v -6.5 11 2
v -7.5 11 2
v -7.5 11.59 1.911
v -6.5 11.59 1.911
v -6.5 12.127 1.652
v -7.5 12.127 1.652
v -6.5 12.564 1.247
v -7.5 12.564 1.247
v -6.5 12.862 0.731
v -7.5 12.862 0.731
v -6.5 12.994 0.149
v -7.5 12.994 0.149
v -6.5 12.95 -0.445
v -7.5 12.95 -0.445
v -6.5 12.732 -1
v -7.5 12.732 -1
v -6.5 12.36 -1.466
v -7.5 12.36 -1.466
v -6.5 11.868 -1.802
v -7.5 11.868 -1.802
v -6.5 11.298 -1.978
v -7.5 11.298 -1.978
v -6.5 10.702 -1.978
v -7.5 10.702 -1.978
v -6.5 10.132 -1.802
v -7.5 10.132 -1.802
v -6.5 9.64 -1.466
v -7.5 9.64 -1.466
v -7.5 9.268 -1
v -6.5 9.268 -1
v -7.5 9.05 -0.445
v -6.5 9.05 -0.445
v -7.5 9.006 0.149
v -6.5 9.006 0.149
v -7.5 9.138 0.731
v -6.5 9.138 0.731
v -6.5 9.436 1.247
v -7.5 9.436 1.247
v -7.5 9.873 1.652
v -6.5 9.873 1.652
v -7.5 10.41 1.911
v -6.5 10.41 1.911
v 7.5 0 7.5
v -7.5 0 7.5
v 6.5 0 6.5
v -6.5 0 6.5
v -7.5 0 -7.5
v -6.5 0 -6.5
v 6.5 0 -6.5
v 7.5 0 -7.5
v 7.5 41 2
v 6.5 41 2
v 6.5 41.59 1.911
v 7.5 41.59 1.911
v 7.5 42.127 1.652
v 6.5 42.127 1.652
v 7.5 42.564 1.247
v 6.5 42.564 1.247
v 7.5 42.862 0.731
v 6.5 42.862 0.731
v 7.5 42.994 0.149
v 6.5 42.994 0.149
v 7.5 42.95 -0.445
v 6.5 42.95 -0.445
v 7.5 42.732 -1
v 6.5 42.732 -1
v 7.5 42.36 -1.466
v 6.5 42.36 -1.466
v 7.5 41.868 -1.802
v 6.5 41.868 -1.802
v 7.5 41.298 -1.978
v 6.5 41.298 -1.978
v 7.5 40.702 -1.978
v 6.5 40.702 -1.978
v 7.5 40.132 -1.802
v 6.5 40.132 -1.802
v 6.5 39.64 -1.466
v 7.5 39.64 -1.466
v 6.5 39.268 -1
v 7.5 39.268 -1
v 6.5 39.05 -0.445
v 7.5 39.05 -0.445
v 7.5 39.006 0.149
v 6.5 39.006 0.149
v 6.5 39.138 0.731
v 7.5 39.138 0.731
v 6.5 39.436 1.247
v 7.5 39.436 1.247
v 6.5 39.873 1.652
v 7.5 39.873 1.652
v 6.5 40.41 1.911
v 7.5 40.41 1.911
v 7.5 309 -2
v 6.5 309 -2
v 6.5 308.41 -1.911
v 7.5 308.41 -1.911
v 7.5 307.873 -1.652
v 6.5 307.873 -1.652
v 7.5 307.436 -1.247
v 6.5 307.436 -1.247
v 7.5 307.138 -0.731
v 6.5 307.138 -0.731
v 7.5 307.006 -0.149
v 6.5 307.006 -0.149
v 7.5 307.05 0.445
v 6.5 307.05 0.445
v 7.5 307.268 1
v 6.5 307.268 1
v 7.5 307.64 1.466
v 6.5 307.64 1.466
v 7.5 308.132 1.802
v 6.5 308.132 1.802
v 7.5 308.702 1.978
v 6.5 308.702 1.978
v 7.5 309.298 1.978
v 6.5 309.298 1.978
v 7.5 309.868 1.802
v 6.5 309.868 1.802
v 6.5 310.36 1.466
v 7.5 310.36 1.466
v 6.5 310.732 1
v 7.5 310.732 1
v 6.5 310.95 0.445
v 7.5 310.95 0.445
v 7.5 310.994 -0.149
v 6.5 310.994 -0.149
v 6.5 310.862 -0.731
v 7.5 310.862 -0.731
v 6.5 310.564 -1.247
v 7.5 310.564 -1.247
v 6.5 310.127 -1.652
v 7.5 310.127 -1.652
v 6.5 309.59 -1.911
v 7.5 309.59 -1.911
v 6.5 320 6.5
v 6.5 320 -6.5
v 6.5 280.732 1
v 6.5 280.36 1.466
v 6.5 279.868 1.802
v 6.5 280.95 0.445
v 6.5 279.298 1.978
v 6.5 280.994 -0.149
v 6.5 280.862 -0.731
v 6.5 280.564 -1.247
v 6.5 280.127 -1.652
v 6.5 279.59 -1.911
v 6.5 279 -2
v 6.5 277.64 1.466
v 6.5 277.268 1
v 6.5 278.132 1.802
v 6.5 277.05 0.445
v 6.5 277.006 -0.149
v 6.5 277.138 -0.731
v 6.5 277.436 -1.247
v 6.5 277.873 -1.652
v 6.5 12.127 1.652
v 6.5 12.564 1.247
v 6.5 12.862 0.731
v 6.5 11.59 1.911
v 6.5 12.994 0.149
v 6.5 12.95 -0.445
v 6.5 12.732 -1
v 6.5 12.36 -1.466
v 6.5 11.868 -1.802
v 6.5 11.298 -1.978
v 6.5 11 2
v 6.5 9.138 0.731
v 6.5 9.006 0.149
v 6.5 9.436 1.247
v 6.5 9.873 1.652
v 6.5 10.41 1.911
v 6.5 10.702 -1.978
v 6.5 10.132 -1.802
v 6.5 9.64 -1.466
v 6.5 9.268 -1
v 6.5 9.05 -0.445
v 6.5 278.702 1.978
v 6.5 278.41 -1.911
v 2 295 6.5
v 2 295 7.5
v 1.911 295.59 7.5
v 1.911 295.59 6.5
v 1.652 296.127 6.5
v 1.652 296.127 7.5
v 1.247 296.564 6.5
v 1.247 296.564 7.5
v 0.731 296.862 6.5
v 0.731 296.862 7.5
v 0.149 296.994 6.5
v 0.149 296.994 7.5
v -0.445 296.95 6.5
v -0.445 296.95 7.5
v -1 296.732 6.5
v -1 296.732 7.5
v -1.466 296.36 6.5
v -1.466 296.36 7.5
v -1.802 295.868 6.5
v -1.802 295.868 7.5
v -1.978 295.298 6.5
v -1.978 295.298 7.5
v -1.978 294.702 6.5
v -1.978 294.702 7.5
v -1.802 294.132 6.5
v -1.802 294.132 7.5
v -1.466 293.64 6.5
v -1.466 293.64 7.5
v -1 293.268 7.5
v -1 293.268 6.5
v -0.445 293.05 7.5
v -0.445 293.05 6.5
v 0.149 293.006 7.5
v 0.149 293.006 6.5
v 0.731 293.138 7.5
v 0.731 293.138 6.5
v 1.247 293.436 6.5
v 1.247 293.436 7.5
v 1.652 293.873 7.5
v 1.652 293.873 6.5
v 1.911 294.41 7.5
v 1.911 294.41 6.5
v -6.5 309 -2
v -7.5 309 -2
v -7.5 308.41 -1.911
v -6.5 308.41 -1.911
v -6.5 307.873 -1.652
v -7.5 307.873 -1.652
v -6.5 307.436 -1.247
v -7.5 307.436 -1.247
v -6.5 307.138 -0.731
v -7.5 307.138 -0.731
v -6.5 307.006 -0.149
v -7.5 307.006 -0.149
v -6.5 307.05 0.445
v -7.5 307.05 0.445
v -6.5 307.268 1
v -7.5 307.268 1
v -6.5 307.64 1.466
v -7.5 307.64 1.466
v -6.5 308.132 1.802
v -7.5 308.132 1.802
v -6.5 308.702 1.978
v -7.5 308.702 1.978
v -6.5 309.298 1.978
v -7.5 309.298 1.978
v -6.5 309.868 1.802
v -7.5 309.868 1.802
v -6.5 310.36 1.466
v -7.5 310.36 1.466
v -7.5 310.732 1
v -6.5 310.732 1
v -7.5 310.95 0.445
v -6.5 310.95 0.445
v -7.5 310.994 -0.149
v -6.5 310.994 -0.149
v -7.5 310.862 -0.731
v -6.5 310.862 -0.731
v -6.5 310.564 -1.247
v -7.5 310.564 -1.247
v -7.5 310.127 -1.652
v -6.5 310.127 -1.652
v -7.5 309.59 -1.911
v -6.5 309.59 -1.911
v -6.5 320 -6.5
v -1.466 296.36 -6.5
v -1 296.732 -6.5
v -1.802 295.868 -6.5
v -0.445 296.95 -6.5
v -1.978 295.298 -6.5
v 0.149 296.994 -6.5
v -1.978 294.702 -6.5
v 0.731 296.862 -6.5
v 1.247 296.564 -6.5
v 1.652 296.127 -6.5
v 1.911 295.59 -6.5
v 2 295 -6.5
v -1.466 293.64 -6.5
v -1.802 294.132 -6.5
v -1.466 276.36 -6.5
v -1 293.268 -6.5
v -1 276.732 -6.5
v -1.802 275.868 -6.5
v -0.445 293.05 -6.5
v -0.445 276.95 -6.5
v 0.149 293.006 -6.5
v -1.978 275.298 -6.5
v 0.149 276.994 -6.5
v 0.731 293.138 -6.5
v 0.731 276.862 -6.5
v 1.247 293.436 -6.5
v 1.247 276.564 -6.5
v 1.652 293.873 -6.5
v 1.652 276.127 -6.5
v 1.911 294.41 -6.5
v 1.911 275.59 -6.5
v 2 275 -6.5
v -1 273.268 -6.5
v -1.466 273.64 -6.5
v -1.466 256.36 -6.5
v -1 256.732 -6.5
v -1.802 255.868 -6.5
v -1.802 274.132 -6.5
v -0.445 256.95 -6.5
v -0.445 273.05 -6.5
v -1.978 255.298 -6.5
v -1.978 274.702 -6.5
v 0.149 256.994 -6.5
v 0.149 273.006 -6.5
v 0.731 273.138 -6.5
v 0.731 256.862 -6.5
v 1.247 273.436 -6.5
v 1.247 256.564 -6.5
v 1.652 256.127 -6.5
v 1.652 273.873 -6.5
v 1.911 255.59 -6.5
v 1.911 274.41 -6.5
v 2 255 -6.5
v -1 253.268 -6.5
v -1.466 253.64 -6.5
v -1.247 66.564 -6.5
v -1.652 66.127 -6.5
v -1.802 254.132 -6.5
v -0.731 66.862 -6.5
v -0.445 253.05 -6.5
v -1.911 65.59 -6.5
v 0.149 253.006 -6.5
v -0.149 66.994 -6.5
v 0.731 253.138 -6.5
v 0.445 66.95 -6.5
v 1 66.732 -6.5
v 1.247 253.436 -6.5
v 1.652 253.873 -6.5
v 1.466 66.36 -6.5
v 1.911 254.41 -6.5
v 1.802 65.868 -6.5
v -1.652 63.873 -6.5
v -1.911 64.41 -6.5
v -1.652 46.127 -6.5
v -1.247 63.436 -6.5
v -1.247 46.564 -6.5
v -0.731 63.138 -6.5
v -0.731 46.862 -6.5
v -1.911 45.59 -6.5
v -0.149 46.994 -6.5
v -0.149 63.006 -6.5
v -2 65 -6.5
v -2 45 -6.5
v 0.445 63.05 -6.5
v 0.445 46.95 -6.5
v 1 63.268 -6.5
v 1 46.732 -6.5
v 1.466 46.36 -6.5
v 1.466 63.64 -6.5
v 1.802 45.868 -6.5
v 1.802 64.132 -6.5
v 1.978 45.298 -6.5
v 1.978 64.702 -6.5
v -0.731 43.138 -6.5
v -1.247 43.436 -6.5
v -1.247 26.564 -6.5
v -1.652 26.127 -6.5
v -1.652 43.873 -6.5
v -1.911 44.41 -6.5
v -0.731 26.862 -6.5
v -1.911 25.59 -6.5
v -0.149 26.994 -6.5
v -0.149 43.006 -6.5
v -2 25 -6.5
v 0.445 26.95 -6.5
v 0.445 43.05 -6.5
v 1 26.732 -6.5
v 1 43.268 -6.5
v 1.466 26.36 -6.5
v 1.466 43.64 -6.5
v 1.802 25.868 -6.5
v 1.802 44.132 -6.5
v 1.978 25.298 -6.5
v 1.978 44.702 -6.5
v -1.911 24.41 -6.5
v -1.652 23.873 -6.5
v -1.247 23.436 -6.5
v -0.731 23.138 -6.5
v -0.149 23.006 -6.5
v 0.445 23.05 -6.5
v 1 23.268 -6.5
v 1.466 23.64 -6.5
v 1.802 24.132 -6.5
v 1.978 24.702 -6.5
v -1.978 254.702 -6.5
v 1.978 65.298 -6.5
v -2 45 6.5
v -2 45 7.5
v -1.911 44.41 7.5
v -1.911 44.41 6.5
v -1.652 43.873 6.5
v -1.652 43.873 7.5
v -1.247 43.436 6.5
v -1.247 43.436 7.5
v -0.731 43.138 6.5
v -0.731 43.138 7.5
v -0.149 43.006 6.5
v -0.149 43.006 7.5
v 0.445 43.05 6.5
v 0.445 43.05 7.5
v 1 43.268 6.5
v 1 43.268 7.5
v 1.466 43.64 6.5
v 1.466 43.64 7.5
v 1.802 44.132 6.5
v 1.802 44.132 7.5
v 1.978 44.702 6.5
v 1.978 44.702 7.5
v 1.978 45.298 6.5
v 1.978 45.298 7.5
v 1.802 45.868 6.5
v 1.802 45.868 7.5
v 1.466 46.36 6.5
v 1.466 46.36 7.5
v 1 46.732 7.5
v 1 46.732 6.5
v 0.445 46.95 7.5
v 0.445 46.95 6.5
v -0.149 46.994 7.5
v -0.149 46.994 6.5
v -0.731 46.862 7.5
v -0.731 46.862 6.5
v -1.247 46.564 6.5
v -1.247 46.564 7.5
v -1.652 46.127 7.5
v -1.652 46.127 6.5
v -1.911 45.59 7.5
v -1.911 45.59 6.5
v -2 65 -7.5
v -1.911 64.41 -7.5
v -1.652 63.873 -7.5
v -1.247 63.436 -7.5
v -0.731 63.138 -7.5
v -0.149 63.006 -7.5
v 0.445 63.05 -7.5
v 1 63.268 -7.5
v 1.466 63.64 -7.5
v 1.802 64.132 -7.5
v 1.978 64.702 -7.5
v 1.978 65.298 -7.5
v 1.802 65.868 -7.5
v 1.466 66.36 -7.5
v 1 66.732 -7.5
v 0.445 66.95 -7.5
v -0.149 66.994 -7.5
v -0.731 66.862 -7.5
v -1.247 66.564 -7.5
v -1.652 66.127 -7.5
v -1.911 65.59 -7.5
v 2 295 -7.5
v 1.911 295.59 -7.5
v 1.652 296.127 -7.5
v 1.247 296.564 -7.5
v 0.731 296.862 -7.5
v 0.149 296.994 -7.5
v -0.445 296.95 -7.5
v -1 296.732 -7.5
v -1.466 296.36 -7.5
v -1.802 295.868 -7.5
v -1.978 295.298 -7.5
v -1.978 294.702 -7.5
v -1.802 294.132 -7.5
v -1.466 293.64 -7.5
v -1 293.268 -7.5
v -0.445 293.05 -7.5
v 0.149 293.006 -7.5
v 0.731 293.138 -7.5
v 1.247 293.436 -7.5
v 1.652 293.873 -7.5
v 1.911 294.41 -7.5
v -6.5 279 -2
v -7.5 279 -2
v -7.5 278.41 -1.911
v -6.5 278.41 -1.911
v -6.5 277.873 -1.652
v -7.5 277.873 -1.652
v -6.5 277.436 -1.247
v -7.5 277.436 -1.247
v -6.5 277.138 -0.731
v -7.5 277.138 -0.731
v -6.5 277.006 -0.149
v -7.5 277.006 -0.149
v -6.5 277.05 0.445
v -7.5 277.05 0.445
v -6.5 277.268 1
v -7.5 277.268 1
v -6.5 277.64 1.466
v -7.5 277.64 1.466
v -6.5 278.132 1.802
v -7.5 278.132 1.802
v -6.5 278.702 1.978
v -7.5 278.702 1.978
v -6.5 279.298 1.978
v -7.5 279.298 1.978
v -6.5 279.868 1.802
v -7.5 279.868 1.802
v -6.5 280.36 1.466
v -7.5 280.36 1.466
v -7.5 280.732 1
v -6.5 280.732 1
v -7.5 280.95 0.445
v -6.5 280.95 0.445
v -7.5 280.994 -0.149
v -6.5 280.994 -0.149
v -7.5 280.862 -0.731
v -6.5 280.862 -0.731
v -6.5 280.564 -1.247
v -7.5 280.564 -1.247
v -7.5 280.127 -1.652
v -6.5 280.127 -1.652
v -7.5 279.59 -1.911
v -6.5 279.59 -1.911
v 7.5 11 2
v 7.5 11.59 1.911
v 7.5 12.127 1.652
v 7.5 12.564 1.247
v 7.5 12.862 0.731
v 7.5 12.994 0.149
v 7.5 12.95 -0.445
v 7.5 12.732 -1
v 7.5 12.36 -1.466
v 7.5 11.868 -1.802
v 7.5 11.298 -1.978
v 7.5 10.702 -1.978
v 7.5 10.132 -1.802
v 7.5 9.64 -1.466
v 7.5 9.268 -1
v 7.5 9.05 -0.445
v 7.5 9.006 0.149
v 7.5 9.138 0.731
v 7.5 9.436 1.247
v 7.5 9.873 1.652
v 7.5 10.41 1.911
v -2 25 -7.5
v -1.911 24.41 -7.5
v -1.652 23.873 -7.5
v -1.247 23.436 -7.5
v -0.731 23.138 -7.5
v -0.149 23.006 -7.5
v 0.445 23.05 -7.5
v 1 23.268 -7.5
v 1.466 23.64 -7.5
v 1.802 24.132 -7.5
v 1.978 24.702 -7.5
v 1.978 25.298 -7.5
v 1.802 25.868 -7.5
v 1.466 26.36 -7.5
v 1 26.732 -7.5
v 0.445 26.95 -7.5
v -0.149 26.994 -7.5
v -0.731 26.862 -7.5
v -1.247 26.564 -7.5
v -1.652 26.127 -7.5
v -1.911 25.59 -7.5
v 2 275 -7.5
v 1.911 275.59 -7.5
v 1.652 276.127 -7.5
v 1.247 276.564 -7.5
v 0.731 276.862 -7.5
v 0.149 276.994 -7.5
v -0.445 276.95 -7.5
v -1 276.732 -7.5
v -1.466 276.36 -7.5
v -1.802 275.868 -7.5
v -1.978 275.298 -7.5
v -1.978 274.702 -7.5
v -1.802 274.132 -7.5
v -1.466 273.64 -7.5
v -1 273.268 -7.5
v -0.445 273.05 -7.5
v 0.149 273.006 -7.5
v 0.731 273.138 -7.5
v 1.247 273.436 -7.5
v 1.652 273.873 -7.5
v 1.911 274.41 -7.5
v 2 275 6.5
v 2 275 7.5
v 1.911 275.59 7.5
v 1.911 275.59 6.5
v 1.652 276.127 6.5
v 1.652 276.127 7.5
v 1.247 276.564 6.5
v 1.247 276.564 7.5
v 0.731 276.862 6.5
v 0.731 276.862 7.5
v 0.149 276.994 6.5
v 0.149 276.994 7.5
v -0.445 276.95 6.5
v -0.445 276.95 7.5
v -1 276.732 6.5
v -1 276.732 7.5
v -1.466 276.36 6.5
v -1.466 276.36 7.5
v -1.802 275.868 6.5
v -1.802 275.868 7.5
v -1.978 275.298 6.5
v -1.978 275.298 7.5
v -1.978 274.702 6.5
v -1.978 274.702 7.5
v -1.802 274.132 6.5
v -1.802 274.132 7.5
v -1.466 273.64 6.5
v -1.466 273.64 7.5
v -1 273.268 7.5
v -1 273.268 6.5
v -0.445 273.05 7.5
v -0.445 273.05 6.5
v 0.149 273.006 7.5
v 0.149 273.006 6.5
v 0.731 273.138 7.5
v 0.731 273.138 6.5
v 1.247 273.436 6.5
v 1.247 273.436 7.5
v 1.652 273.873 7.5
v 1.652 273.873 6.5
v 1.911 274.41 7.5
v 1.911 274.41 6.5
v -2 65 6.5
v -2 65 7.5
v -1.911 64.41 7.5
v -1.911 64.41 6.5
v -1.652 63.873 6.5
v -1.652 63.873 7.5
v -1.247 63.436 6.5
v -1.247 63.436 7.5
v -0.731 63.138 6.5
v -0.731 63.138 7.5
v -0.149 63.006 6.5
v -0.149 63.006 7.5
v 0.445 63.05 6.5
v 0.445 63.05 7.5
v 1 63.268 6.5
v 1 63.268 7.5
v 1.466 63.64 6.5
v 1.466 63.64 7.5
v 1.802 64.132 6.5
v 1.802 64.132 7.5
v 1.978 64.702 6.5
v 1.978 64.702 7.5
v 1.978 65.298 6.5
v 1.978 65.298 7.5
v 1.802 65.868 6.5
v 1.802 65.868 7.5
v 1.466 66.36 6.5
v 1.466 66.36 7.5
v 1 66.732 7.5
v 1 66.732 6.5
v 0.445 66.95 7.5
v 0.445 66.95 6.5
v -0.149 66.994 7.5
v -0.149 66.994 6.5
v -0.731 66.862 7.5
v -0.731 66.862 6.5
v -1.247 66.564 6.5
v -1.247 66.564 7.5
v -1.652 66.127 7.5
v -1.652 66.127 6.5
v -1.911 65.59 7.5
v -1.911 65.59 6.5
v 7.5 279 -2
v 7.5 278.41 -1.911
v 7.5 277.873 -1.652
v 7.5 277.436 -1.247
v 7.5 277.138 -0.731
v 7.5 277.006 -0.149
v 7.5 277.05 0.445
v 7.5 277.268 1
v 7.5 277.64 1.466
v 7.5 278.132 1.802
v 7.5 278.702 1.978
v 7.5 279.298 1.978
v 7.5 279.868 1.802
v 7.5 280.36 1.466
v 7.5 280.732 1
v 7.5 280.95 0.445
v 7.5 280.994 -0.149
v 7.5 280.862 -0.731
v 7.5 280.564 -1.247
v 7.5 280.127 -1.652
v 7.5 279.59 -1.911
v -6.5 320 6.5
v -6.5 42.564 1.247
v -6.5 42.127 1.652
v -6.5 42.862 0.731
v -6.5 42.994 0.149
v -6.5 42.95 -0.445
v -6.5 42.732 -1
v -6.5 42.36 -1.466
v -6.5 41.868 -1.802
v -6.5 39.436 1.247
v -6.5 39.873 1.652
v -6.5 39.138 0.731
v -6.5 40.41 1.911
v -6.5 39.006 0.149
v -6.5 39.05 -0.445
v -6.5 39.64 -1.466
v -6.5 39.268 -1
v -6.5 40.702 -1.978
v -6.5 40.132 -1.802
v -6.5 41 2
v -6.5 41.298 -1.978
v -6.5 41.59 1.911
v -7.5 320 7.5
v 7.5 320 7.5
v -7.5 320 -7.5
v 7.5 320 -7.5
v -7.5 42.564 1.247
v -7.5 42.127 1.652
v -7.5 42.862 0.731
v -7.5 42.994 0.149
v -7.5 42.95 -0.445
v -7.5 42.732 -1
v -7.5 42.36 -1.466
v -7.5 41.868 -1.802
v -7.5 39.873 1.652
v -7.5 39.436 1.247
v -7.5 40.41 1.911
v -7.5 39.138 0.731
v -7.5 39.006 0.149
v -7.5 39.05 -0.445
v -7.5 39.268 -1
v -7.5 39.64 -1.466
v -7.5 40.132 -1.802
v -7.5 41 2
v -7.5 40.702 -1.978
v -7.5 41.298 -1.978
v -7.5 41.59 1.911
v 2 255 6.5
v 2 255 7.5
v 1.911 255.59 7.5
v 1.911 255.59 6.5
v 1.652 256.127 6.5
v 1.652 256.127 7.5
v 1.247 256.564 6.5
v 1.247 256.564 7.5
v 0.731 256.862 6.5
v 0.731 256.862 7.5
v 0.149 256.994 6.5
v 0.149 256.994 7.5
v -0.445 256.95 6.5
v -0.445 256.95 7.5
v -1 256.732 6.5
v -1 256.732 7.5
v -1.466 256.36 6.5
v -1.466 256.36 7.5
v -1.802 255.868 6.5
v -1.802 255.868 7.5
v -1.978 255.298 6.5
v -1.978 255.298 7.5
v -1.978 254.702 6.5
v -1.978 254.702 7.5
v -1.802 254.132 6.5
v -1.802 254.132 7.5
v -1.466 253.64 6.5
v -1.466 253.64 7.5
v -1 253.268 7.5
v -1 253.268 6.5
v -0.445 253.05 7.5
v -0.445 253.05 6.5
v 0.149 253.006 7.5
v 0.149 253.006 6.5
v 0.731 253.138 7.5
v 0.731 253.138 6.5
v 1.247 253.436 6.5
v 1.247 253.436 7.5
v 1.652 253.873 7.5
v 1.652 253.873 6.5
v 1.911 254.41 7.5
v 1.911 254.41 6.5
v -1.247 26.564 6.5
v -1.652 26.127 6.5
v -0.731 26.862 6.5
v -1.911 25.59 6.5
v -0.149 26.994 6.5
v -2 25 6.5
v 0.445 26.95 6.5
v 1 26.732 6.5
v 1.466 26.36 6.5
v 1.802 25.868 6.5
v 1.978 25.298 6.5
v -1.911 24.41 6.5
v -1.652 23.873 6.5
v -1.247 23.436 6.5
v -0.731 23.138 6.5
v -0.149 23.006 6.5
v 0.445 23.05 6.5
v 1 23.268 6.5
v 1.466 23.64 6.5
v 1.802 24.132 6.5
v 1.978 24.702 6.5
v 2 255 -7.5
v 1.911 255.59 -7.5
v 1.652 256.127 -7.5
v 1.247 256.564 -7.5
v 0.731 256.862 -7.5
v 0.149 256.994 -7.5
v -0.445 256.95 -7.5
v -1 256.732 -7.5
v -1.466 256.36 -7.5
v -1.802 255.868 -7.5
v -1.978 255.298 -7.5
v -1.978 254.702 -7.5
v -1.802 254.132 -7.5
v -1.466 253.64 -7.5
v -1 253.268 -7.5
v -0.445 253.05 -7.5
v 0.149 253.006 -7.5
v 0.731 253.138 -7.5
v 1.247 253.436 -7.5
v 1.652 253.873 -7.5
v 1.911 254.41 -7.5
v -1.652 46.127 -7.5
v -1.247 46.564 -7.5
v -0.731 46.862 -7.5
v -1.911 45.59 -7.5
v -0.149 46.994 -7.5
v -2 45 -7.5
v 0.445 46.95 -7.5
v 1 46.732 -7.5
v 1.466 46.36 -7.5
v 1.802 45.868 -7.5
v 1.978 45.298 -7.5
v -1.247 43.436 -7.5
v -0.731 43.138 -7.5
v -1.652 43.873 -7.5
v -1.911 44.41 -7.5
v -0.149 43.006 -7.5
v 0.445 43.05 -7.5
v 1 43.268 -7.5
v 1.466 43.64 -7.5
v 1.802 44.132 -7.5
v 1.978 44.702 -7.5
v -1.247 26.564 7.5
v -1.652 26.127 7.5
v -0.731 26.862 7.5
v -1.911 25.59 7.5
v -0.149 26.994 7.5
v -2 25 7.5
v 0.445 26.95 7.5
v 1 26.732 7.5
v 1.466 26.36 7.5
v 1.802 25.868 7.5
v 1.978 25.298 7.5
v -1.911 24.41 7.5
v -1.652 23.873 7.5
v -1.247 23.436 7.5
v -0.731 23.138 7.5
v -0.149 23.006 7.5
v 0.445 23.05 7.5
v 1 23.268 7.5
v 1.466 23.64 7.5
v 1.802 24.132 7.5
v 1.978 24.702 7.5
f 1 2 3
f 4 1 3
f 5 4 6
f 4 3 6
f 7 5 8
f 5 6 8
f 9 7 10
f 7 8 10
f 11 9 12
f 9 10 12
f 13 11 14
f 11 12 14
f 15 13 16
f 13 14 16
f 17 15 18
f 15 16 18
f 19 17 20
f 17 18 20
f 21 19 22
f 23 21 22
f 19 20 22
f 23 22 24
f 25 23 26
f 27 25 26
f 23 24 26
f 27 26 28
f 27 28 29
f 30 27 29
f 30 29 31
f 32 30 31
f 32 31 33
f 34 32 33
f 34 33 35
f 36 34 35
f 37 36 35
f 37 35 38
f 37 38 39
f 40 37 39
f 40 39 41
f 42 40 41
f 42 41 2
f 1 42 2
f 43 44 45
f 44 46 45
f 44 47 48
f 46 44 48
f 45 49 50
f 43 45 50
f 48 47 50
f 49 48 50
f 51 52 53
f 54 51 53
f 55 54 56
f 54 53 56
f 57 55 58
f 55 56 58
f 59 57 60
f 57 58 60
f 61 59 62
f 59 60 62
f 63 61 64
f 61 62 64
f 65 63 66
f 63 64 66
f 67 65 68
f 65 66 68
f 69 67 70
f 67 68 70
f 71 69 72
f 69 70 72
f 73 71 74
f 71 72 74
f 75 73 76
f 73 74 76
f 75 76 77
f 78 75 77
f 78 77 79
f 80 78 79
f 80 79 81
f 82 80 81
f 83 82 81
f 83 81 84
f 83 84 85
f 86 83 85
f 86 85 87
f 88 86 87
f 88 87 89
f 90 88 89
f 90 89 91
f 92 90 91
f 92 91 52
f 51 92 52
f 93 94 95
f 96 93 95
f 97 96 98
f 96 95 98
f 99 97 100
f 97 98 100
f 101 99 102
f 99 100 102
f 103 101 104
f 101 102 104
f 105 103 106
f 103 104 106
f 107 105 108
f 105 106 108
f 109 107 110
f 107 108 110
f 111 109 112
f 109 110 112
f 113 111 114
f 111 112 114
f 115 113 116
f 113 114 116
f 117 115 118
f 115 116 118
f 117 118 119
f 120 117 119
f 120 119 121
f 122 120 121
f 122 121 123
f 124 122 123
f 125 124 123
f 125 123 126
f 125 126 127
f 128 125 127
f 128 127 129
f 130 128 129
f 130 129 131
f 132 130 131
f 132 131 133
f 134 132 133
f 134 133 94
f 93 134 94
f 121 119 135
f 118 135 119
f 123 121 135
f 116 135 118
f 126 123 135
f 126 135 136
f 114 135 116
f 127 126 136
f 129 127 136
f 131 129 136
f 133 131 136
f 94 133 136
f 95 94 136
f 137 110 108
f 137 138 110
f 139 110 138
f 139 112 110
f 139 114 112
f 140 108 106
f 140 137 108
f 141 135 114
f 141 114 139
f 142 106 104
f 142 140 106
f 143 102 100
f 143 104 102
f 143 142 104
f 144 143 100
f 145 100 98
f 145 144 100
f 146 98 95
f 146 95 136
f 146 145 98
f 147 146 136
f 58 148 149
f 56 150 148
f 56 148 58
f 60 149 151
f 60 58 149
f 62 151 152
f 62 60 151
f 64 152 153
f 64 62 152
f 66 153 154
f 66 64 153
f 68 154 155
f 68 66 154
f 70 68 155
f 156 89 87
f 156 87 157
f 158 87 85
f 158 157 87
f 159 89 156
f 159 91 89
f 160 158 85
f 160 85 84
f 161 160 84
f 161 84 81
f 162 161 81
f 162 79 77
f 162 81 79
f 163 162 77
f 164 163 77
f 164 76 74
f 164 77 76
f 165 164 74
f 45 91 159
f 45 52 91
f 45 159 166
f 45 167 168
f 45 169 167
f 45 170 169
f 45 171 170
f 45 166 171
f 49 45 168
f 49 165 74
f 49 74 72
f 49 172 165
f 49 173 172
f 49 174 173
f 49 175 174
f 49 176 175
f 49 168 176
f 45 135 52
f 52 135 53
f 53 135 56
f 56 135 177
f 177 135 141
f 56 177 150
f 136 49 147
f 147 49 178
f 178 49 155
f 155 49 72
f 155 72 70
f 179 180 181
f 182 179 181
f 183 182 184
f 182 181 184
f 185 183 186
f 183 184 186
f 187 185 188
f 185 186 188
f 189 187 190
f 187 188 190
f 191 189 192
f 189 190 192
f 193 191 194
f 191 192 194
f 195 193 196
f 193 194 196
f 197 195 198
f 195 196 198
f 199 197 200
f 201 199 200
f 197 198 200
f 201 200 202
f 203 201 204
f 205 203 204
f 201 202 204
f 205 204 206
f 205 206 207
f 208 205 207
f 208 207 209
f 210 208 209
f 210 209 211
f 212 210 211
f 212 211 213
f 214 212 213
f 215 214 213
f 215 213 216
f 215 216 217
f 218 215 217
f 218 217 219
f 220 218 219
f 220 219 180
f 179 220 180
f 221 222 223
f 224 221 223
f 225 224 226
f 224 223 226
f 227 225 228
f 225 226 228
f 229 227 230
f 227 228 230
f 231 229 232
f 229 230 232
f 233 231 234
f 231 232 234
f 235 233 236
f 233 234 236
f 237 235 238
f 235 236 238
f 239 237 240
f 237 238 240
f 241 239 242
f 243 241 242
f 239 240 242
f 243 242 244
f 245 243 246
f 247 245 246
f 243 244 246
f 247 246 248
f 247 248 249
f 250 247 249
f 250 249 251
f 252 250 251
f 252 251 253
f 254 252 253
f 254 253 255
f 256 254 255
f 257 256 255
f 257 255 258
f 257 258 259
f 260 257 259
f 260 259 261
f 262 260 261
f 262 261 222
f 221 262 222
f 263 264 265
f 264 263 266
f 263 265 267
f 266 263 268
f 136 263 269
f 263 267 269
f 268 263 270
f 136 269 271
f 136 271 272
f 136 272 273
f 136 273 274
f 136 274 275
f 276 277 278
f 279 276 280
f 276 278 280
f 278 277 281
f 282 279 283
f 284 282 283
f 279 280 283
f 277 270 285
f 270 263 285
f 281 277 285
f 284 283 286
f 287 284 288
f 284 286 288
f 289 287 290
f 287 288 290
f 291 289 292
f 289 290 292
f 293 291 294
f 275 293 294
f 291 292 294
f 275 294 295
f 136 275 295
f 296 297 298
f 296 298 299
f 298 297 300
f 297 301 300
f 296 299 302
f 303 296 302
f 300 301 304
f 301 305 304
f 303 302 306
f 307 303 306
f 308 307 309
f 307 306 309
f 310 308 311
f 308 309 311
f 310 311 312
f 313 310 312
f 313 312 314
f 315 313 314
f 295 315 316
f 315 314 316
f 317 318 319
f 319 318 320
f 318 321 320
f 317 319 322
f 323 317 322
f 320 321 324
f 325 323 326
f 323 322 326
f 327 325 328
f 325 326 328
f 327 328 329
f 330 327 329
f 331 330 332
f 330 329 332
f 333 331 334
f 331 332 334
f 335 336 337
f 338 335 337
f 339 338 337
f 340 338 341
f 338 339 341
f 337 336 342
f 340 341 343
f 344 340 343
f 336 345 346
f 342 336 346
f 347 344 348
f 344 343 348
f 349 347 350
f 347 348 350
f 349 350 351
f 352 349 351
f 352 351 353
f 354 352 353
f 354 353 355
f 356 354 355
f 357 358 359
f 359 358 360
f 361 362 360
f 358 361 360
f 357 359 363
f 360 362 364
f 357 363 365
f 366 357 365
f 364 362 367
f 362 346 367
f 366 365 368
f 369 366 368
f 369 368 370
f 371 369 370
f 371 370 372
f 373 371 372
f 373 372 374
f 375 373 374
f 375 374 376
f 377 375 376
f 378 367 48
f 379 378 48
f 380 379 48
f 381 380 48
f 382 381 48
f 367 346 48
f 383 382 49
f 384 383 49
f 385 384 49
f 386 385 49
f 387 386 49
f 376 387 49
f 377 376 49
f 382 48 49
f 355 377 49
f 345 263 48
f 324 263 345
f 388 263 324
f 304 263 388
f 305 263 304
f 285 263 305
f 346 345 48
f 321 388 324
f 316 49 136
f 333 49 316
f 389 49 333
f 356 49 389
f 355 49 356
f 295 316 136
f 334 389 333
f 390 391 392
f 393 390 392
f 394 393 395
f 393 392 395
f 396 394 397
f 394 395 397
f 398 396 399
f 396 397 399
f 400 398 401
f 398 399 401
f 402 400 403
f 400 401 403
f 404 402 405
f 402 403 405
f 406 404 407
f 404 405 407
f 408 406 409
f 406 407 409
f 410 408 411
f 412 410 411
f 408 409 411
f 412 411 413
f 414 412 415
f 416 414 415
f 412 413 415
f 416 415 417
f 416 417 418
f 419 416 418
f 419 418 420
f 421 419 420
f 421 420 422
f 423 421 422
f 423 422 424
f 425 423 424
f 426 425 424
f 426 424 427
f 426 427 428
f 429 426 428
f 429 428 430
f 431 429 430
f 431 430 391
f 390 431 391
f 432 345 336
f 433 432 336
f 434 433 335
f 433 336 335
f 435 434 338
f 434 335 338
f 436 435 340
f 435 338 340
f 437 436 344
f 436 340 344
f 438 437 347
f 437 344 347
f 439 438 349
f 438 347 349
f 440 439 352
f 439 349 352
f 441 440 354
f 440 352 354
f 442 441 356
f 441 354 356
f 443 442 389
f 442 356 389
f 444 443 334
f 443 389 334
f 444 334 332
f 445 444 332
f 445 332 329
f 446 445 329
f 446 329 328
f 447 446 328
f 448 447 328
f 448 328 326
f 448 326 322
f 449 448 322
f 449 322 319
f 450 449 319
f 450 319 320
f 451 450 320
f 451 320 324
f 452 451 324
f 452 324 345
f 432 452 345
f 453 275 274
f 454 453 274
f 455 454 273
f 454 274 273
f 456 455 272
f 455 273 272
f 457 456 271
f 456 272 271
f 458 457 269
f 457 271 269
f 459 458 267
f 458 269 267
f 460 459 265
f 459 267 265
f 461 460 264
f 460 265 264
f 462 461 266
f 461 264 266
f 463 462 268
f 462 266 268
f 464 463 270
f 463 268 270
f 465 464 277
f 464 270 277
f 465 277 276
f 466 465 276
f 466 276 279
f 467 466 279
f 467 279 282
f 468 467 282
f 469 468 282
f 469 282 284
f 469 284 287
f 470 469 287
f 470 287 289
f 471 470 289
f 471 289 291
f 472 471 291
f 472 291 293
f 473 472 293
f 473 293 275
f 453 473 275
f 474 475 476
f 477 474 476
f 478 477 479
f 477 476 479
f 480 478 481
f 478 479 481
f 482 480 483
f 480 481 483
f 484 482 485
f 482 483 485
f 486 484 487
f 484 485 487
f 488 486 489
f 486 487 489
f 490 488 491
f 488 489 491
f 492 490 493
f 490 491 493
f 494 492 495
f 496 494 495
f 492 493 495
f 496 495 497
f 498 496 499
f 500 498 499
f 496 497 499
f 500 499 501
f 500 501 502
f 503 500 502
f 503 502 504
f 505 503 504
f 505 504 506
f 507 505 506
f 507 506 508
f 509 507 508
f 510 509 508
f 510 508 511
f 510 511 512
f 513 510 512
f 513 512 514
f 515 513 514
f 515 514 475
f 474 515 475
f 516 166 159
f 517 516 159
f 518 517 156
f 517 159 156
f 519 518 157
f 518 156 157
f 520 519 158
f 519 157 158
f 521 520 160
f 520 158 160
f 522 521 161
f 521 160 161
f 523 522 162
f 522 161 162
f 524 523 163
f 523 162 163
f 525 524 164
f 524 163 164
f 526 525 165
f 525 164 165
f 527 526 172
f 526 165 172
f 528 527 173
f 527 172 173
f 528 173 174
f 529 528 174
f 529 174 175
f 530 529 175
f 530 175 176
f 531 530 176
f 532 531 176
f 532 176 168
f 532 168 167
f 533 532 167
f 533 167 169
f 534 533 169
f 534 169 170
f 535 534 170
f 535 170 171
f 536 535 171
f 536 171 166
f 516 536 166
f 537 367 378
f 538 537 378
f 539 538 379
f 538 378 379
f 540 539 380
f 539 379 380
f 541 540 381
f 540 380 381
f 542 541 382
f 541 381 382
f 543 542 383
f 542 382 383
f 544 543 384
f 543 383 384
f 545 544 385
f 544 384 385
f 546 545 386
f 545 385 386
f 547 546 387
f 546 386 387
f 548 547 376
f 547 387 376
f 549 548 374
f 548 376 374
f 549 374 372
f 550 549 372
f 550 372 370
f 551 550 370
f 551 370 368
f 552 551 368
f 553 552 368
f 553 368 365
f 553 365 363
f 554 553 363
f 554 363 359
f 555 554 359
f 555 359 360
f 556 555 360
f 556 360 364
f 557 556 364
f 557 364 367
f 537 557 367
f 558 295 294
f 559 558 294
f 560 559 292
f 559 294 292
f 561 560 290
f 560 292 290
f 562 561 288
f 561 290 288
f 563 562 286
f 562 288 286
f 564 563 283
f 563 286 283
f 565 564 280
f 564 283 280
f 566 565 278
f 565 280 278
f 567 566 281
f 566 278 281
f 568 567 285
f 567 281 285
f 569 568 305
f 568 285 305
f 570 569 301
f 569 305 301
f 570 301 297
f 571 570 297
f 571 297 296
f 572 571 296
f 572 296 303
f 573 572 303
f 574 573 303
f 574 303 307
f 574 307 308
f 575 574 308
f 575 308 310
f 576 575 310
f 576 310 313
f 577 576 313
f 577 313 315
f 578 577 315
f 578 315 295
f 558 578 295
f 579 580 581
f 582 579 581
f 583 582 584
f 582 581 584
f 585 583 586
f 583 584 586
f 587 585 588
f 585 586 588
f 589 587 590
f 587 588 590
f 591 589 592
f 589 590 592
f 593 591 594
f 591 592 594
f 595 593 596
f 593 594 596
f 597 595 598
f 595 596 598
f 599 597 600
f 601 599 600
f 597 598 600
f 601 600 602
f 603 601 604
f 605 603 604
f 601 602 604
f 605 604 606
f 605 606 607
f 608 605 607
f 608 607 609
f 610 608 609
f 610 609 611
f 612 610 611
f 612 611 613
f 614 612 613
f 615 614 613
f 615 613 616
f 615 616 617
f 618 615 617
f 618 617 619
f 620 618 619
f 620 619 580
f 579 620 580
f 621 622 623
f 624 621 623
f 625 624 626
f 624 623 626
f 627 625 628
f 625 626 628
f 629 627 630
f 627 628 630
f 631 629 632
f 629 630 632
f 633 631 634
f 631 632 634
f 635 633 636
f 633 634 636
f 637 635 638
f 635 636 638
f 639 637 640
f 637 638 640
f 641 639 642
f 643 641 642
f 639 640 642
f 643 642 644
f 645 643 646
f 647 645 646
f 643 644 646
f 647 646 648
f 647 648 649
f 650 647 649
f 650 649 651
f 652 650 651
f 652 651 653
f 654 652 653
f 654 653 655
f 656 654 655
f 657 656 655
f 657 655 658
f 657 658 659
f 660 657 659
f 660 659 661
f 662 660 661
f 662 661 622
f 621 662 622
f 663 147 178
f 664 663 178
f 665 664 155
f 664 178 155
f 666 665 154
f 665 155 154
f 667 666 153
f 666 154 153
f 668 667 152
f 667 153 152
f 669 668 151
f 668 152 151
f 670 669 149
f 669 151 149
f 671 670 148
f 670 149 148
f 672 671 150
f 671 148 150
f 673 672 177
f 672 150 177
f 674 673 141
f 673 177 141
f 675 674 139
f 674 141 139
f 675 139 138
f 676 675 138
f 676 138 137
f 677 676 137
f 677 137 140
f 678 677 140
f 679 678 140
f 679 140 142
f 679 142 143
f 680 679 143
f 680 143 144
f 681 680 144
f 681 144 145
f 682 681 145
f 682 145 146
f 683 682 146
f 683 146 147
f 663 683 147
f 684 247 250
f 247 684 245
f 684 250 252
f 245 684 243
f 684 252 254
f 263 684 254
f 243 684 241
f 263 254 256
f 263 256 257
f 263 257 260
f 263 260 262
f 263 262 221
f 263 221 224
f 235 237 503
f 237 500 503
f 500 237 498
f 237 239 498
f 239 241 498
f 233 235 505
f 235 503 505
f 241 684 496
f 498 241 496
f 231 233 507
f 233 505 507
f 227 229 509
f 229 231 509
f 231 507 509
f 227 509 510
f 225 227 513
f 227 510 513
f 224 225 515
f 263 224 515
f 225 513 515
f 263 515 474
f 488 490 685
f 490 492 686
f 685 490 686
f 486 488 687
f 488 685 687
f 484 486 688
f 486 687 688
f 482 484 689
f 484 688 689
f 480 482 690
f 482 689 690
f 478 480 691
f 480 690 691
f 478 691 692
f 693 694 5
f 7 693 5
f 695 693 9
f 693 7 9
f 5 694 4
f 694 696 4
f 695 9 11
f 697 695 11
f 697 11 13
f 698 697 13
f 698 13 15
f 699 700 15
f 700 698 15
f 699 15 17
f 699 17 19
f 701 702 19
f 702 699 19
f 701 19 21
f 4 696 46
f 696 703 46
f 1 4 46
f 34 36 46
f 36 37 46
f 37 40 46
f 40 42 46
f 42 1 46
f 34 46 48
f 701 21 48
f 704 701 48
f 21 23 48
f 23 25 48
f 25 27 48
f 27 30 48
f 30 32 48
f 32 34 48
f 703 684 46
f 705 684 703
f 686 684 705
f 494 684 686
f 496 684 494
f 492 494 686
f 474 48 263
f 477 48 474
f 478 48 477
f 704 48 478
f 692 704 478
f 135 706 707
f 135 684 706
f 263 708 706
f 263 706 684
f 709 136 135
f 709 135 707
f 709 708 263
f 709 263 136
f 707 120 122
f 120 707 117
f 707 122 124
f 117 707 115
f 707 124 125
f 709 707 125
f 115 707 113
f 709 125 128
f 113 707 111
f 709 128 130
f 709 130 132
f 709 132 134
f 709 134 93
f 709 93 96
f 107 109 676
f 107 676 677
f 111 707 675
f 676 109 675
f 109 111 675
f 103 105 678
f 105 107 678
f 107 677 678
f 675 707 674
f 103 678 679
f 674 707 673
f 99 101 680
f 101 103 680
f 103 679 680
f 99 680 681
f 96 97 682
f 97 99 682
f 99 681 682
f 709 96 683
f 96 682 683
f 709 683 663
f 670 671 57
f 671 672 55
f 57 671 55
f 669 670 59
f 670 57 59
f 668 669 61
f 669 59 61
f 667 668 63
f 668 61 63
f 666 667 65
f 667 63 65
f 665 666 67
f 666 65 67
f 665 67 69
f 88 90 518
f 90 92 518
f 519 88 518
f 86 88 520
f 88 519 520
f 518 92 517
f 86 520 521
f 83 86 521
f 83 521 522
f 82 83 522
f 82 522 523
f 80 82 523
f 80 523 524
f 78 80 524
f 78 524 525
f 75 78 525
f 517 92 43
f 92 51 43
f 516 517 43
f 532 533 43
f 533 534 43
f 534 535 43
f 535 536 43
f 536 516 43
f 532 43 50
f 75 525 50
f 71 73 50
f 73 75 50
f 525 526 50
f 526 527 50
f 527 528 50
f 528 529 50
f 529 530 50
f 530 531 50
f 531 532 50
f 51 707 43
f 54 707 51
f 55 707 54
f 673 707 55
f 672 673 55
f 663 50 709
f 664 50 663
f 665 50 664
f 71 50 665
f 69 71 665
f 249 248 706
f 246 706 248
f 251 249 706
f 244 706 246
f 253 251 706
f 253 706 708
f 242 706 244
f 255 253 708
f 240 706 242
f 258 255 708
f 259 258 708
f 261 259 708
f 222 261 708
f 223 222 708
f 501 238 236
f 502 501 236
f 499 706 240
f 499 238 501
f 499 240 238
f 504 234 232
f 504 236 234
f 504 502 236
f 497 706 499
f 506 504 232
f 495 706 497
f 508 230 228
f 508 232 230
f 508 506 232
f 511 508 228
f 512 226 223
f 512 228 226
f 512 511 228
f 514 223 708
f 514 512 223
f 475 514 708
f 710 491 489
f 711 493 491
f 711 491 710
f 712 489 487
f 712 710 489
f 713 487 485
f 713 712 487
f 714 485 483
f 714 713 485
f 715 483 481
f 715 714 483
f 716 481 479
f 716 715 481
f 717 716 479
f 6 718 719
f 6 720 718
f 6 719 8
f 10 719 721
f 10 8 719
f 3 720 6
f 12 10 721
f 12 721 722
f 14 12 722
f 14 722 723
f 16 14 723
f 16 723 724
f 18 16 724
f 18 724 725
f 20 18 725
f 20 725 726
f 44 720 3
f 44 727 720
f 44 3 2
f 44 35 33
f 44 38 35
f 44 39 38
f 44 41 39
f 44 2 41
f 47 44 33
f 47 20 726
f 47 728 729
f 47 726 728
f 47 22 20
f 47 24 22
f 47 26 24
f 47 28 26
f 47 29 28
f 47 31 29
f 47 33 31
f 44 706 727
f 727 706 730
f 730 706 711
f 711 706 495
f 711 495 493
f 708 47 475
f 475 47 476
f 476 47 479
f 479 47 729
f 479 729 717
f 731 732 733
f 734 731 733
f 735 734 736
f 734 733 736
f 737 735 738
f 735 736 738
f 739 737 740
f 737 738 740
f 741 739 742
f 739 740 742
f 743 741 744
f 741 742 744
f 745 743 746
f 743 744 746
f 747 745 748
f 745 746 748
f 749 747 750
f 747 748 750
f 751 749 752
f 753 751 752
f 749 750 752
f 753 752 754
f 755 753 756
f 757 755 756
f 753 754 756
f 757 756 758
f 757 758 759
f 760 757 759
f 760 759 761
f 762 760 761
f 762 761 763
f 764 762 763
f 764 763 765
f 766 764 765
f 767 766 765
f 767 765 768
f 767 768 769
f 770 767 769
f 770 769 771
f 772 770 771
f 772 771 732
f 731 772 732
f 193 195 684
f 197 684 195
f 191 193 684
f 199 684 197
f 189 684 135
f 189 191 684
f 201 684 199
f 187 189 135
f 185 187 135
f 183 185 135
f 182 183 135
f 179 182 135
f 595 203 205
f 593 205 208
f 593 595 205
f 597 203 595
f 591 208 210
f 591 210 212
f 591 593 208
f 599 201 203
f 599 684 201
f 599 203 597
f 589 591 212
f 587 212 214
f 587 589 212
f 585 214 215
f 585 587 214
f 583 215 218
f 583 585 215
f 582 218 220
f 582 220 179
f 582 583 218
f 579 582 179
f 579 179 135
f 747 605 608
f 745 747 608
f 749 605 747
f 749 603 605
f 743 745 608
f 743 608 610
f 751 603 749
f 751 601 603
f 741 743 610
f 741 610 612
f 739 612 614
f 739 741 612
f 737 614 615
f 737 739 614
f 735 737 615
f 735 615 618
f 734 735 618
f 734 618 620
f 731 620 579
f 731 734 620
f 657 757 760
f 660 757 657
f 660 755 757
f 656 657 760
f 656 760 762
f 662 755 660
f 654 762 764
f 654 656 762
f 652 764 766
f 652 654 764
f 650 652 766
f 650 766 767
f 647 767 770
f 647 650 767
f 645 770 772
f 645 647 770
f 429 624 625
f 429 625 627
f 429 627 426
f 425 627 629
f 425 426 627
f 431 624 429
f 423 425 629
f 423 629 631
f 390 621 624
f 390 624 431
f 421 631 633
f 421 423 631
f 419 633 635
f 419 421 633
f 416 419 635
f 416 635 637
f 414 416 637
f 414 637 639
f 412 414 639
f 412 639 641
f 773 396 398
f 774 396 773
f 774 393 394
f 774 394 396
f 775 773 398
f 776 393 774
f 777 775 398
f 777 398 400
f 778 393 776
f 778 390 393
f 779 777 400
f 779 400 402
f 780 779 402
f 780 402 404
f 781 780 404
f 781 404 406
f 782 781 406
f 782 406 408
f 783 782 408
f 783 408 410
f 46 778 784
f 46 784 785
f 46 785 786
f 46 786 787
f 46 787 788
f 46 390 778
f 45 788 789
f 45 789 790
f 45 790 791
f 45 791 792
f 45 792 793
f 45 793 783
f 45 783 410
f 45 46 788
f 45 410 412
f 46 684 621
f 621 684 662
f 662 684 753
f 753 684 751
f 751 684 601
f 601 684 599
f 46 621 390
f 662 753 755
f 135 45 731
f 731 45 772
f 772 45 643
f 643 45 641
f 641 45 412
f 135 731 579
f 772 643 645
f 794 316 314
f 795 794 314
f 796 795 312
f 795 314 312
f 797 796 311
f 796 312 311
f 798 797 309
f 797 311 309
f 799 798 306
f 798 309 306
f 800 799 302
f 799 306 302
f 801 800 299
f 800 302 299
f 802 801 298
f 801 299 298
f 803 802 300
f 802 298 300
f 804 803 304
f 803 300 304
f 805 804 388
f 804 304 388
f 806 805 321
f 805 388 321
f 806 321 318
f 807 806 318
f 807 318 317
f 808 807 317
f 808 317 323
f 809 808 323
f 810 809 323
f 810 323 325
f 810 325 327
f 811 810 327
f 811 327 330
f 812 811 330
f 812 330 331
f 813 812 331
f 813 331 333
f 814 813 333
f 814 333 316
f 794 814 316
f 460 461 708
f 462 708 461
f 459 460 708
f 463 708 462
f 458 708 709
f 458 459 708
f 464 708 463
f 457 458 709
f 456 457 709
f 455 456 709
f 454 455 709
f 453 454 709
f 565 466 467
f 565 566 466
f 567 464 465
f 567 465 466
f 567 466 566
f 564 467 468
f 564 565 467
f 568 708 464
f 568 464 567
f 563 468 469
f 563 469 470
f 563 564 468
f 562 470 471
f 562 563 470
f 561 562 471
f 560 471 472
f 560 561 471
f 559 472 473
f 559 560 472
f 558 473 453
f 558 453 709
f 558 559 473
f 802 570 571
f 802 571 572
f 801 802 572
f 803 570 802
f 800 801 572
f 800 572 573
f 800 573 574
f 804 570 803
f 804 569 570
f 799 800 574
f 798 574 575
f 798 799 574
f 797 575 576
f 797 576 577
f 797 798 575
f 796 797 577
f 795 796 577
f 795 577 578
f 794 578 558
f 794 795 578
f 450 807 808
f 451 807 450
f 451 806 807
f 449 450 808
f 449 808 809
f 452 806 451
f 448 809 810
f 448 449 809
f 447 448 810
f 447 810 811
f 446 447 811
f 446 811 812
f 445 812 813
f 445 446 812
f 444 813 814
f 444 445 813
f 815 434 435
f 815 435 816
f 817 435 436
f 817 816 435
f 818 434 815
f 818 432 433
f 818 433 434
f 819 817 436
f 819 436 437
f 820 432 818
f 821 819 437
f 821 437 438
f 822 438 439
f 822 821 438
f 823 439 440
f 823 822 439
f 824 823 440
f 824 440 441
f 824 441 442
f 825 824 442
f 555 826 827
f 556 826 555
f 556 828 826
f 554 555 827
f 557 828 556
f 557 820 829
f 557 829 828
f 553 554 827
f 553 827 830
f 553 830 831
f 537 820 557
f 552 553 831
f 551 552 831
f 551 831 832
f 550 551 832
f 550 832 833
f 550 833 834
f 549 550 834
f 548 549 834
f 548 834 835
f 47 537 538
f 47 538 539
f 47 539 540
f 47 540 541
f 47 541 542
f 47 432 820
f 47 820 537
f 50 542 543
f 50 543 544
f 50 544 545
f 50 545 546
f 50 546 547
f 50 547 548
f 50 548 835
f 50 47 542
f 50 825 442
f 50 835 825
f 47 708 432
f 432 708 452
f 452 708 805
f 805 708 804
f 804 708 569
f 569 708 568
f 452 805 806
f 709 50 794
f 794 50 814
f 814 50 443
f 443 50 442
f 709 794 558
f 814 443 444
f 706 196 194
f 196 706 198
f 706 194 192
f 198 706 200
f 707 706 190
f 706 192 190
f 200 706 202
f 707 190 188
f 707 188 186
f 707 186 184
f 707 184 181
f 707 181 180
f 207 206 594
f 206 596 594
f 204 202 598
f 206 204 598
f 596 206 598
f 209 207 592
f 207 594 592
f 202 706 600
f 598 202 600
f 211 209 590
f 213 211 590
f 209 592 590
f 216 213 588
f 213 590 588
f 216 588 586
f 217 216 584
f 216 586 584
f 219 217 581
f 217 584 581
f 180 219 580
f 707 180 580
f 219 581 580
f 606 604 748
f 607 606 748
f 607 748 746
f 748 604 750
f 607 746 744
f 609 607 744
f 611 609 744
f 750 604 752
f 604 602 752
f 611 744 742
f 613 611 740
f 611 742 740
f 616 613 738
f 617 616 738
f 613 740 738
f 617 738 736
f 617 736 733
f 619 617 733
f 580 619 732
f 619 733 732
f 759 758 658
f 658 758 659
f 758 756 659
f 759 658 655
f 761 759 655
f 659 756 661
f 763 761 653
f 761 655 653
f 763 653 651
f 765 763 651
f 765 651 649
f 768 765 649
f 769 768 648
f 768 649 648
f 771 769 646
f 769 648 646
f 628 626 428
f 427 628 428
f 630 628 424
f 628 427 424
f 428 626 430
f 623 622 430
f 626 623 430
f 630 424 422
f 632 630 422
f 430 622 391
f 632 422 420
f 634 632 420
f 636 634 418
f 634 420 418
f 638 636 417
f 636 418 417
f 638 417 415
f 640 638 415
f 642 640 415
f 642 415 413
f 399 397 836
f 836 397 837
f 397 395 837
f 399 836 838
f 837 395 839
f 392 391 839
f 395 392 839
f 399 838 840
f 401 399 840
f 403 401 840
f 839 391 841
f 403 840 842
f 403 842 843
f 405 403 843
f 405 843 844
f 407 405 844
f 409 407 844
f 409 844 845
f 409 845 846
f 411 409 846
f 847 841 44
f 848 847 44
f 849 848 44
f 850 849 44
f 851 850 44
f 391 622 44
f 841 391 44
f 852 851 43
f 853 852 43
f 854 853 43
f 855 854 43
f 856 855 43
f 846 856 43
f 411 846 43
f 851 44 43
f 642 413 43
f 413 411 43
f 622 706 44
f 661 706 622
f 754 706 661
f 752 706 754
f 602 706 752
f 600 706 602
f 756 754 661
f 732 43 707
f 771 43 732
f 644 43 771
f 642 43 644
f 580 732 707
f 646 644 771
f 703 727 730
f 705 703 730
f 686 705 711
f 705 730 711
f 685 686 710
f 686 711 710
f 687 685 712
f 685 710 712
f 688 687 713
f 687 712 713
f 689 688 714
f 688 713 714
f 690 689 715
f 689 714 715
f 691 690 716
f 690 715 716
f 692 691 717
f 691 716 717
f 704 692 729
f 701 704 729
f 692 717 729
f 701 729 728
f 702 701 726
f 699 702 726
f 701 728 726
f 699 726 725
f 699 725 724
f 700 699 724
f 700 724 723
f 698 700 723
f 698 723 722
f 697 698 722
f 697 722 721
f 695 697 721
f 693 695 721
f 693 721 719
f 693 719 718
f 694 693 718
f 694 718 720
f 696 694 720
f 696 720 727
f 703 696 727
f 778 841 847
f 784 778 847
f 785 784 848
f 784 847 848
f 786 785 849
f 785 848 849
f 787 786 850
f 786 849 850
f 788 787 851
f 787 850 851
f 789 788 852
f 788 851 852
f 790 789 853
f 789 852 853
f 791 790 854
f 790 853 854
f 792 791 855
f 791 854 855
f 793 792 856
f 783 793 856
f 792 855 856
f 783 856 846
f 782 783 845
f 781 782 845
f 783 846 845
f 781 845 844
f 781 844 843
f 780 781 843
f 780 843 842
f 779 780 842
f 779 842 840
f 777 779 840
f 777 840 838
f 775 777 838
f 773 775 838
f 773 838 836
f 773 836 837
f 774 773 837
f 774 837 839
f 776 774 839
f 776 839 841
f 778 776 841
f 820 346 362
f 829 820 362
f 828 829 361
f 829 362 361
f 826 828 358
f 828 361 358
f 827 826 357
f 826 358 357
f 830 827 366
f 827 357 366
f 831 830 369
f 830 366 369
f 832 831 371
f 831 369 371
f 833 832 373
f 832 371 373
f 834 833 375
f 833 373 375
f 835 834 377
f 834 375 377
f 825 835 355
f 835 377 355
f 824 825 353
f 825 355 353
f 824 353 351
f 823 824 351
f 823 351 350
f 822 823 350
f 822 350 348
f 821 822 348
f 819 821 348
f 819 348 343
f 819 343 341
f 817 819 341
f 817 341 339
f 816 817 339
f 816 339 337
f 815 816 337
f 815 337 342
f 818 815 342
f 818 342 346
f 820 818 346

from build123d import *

# Parameters (mm, degrees)
SKETCH_1_W          = 15
SKETCH_1_H          = 15
SKETCH_1_W_2        = 13
SKETCH_1_H_2        = 13
EXTRUDE_1_DEPTH     = 320
SKETCH_3_R          = 2
CUT_EXTRUDE_2_DEPTH = 321.43915179
SKETCH_4_R          = 2
CUT_EXTRUDE_3_DEPTH = 321.43915179


with BuildPart() as part:
    # 草图1 → 凸台-拉伸1 (new body)
    with BuildSketch(Plane(origin=(0, 0, 0), x_dir=(1, 0, 0), z_dir=(0, 1, 0))):
        Rectangle(SKETCH_1_W, SKETCH_1_H)
        Rectangle(SKETCH_1_W_2, SKETCH_1_H_2, mode=Mode.SUBTRACT)
    extrude(amount=EXTRUDE_1_DEPTH)

    # 草图3 → 切除-拉伸2 (cut, through all)
    with BuildSketch(Plane.XY.offset(7.5)):
        with Locations((0, 295)):
            Circle(SKETCH_3_R)
        with Locations((0, 275)):
            Circle(SKETCH_3_R)
        with Locations(Location((0, 45, 0), (0, 0, 180))):
            Circle(SKETCH_3_R)
        with Locations(Location((0, 25, 0), (0, 0, 180))):
            Circle(SKETCH_3_R)
        with Locations((0, 255)):
            Circle(SKETCH_3_R)
        with Locations(Location((0, 65, 0), (0, 0, 180))):
            Circle(SKETCH_3_R)
    extrude(amount=-CUT_EXTRUDE_2_DEPTH, mode=Mode.SUBTRACT)

    # 草图4 → 切除-拉伸3 (cut, through all)
    with BuildSketch(Plane.ZY.offset(7.5)):
        with Locations((0, 11)):
            Circle(SKETCH_4_R)
        with Locations((0, 41)):
            Circle(SKETCH_4_R)
        with Locations(Location((0, 279, 0), (0, 0, 180))):
            Circle(SKETCH_4_R)
        with Locations(Location((0, 309, 0), (0, 0, 180))):
            Circle(SKETCH_4_R)
    extrude(amount=-CUT_EXTRUDE_3_DEPTH, mode=Mode.SUBTRACT)


solid = part.part
